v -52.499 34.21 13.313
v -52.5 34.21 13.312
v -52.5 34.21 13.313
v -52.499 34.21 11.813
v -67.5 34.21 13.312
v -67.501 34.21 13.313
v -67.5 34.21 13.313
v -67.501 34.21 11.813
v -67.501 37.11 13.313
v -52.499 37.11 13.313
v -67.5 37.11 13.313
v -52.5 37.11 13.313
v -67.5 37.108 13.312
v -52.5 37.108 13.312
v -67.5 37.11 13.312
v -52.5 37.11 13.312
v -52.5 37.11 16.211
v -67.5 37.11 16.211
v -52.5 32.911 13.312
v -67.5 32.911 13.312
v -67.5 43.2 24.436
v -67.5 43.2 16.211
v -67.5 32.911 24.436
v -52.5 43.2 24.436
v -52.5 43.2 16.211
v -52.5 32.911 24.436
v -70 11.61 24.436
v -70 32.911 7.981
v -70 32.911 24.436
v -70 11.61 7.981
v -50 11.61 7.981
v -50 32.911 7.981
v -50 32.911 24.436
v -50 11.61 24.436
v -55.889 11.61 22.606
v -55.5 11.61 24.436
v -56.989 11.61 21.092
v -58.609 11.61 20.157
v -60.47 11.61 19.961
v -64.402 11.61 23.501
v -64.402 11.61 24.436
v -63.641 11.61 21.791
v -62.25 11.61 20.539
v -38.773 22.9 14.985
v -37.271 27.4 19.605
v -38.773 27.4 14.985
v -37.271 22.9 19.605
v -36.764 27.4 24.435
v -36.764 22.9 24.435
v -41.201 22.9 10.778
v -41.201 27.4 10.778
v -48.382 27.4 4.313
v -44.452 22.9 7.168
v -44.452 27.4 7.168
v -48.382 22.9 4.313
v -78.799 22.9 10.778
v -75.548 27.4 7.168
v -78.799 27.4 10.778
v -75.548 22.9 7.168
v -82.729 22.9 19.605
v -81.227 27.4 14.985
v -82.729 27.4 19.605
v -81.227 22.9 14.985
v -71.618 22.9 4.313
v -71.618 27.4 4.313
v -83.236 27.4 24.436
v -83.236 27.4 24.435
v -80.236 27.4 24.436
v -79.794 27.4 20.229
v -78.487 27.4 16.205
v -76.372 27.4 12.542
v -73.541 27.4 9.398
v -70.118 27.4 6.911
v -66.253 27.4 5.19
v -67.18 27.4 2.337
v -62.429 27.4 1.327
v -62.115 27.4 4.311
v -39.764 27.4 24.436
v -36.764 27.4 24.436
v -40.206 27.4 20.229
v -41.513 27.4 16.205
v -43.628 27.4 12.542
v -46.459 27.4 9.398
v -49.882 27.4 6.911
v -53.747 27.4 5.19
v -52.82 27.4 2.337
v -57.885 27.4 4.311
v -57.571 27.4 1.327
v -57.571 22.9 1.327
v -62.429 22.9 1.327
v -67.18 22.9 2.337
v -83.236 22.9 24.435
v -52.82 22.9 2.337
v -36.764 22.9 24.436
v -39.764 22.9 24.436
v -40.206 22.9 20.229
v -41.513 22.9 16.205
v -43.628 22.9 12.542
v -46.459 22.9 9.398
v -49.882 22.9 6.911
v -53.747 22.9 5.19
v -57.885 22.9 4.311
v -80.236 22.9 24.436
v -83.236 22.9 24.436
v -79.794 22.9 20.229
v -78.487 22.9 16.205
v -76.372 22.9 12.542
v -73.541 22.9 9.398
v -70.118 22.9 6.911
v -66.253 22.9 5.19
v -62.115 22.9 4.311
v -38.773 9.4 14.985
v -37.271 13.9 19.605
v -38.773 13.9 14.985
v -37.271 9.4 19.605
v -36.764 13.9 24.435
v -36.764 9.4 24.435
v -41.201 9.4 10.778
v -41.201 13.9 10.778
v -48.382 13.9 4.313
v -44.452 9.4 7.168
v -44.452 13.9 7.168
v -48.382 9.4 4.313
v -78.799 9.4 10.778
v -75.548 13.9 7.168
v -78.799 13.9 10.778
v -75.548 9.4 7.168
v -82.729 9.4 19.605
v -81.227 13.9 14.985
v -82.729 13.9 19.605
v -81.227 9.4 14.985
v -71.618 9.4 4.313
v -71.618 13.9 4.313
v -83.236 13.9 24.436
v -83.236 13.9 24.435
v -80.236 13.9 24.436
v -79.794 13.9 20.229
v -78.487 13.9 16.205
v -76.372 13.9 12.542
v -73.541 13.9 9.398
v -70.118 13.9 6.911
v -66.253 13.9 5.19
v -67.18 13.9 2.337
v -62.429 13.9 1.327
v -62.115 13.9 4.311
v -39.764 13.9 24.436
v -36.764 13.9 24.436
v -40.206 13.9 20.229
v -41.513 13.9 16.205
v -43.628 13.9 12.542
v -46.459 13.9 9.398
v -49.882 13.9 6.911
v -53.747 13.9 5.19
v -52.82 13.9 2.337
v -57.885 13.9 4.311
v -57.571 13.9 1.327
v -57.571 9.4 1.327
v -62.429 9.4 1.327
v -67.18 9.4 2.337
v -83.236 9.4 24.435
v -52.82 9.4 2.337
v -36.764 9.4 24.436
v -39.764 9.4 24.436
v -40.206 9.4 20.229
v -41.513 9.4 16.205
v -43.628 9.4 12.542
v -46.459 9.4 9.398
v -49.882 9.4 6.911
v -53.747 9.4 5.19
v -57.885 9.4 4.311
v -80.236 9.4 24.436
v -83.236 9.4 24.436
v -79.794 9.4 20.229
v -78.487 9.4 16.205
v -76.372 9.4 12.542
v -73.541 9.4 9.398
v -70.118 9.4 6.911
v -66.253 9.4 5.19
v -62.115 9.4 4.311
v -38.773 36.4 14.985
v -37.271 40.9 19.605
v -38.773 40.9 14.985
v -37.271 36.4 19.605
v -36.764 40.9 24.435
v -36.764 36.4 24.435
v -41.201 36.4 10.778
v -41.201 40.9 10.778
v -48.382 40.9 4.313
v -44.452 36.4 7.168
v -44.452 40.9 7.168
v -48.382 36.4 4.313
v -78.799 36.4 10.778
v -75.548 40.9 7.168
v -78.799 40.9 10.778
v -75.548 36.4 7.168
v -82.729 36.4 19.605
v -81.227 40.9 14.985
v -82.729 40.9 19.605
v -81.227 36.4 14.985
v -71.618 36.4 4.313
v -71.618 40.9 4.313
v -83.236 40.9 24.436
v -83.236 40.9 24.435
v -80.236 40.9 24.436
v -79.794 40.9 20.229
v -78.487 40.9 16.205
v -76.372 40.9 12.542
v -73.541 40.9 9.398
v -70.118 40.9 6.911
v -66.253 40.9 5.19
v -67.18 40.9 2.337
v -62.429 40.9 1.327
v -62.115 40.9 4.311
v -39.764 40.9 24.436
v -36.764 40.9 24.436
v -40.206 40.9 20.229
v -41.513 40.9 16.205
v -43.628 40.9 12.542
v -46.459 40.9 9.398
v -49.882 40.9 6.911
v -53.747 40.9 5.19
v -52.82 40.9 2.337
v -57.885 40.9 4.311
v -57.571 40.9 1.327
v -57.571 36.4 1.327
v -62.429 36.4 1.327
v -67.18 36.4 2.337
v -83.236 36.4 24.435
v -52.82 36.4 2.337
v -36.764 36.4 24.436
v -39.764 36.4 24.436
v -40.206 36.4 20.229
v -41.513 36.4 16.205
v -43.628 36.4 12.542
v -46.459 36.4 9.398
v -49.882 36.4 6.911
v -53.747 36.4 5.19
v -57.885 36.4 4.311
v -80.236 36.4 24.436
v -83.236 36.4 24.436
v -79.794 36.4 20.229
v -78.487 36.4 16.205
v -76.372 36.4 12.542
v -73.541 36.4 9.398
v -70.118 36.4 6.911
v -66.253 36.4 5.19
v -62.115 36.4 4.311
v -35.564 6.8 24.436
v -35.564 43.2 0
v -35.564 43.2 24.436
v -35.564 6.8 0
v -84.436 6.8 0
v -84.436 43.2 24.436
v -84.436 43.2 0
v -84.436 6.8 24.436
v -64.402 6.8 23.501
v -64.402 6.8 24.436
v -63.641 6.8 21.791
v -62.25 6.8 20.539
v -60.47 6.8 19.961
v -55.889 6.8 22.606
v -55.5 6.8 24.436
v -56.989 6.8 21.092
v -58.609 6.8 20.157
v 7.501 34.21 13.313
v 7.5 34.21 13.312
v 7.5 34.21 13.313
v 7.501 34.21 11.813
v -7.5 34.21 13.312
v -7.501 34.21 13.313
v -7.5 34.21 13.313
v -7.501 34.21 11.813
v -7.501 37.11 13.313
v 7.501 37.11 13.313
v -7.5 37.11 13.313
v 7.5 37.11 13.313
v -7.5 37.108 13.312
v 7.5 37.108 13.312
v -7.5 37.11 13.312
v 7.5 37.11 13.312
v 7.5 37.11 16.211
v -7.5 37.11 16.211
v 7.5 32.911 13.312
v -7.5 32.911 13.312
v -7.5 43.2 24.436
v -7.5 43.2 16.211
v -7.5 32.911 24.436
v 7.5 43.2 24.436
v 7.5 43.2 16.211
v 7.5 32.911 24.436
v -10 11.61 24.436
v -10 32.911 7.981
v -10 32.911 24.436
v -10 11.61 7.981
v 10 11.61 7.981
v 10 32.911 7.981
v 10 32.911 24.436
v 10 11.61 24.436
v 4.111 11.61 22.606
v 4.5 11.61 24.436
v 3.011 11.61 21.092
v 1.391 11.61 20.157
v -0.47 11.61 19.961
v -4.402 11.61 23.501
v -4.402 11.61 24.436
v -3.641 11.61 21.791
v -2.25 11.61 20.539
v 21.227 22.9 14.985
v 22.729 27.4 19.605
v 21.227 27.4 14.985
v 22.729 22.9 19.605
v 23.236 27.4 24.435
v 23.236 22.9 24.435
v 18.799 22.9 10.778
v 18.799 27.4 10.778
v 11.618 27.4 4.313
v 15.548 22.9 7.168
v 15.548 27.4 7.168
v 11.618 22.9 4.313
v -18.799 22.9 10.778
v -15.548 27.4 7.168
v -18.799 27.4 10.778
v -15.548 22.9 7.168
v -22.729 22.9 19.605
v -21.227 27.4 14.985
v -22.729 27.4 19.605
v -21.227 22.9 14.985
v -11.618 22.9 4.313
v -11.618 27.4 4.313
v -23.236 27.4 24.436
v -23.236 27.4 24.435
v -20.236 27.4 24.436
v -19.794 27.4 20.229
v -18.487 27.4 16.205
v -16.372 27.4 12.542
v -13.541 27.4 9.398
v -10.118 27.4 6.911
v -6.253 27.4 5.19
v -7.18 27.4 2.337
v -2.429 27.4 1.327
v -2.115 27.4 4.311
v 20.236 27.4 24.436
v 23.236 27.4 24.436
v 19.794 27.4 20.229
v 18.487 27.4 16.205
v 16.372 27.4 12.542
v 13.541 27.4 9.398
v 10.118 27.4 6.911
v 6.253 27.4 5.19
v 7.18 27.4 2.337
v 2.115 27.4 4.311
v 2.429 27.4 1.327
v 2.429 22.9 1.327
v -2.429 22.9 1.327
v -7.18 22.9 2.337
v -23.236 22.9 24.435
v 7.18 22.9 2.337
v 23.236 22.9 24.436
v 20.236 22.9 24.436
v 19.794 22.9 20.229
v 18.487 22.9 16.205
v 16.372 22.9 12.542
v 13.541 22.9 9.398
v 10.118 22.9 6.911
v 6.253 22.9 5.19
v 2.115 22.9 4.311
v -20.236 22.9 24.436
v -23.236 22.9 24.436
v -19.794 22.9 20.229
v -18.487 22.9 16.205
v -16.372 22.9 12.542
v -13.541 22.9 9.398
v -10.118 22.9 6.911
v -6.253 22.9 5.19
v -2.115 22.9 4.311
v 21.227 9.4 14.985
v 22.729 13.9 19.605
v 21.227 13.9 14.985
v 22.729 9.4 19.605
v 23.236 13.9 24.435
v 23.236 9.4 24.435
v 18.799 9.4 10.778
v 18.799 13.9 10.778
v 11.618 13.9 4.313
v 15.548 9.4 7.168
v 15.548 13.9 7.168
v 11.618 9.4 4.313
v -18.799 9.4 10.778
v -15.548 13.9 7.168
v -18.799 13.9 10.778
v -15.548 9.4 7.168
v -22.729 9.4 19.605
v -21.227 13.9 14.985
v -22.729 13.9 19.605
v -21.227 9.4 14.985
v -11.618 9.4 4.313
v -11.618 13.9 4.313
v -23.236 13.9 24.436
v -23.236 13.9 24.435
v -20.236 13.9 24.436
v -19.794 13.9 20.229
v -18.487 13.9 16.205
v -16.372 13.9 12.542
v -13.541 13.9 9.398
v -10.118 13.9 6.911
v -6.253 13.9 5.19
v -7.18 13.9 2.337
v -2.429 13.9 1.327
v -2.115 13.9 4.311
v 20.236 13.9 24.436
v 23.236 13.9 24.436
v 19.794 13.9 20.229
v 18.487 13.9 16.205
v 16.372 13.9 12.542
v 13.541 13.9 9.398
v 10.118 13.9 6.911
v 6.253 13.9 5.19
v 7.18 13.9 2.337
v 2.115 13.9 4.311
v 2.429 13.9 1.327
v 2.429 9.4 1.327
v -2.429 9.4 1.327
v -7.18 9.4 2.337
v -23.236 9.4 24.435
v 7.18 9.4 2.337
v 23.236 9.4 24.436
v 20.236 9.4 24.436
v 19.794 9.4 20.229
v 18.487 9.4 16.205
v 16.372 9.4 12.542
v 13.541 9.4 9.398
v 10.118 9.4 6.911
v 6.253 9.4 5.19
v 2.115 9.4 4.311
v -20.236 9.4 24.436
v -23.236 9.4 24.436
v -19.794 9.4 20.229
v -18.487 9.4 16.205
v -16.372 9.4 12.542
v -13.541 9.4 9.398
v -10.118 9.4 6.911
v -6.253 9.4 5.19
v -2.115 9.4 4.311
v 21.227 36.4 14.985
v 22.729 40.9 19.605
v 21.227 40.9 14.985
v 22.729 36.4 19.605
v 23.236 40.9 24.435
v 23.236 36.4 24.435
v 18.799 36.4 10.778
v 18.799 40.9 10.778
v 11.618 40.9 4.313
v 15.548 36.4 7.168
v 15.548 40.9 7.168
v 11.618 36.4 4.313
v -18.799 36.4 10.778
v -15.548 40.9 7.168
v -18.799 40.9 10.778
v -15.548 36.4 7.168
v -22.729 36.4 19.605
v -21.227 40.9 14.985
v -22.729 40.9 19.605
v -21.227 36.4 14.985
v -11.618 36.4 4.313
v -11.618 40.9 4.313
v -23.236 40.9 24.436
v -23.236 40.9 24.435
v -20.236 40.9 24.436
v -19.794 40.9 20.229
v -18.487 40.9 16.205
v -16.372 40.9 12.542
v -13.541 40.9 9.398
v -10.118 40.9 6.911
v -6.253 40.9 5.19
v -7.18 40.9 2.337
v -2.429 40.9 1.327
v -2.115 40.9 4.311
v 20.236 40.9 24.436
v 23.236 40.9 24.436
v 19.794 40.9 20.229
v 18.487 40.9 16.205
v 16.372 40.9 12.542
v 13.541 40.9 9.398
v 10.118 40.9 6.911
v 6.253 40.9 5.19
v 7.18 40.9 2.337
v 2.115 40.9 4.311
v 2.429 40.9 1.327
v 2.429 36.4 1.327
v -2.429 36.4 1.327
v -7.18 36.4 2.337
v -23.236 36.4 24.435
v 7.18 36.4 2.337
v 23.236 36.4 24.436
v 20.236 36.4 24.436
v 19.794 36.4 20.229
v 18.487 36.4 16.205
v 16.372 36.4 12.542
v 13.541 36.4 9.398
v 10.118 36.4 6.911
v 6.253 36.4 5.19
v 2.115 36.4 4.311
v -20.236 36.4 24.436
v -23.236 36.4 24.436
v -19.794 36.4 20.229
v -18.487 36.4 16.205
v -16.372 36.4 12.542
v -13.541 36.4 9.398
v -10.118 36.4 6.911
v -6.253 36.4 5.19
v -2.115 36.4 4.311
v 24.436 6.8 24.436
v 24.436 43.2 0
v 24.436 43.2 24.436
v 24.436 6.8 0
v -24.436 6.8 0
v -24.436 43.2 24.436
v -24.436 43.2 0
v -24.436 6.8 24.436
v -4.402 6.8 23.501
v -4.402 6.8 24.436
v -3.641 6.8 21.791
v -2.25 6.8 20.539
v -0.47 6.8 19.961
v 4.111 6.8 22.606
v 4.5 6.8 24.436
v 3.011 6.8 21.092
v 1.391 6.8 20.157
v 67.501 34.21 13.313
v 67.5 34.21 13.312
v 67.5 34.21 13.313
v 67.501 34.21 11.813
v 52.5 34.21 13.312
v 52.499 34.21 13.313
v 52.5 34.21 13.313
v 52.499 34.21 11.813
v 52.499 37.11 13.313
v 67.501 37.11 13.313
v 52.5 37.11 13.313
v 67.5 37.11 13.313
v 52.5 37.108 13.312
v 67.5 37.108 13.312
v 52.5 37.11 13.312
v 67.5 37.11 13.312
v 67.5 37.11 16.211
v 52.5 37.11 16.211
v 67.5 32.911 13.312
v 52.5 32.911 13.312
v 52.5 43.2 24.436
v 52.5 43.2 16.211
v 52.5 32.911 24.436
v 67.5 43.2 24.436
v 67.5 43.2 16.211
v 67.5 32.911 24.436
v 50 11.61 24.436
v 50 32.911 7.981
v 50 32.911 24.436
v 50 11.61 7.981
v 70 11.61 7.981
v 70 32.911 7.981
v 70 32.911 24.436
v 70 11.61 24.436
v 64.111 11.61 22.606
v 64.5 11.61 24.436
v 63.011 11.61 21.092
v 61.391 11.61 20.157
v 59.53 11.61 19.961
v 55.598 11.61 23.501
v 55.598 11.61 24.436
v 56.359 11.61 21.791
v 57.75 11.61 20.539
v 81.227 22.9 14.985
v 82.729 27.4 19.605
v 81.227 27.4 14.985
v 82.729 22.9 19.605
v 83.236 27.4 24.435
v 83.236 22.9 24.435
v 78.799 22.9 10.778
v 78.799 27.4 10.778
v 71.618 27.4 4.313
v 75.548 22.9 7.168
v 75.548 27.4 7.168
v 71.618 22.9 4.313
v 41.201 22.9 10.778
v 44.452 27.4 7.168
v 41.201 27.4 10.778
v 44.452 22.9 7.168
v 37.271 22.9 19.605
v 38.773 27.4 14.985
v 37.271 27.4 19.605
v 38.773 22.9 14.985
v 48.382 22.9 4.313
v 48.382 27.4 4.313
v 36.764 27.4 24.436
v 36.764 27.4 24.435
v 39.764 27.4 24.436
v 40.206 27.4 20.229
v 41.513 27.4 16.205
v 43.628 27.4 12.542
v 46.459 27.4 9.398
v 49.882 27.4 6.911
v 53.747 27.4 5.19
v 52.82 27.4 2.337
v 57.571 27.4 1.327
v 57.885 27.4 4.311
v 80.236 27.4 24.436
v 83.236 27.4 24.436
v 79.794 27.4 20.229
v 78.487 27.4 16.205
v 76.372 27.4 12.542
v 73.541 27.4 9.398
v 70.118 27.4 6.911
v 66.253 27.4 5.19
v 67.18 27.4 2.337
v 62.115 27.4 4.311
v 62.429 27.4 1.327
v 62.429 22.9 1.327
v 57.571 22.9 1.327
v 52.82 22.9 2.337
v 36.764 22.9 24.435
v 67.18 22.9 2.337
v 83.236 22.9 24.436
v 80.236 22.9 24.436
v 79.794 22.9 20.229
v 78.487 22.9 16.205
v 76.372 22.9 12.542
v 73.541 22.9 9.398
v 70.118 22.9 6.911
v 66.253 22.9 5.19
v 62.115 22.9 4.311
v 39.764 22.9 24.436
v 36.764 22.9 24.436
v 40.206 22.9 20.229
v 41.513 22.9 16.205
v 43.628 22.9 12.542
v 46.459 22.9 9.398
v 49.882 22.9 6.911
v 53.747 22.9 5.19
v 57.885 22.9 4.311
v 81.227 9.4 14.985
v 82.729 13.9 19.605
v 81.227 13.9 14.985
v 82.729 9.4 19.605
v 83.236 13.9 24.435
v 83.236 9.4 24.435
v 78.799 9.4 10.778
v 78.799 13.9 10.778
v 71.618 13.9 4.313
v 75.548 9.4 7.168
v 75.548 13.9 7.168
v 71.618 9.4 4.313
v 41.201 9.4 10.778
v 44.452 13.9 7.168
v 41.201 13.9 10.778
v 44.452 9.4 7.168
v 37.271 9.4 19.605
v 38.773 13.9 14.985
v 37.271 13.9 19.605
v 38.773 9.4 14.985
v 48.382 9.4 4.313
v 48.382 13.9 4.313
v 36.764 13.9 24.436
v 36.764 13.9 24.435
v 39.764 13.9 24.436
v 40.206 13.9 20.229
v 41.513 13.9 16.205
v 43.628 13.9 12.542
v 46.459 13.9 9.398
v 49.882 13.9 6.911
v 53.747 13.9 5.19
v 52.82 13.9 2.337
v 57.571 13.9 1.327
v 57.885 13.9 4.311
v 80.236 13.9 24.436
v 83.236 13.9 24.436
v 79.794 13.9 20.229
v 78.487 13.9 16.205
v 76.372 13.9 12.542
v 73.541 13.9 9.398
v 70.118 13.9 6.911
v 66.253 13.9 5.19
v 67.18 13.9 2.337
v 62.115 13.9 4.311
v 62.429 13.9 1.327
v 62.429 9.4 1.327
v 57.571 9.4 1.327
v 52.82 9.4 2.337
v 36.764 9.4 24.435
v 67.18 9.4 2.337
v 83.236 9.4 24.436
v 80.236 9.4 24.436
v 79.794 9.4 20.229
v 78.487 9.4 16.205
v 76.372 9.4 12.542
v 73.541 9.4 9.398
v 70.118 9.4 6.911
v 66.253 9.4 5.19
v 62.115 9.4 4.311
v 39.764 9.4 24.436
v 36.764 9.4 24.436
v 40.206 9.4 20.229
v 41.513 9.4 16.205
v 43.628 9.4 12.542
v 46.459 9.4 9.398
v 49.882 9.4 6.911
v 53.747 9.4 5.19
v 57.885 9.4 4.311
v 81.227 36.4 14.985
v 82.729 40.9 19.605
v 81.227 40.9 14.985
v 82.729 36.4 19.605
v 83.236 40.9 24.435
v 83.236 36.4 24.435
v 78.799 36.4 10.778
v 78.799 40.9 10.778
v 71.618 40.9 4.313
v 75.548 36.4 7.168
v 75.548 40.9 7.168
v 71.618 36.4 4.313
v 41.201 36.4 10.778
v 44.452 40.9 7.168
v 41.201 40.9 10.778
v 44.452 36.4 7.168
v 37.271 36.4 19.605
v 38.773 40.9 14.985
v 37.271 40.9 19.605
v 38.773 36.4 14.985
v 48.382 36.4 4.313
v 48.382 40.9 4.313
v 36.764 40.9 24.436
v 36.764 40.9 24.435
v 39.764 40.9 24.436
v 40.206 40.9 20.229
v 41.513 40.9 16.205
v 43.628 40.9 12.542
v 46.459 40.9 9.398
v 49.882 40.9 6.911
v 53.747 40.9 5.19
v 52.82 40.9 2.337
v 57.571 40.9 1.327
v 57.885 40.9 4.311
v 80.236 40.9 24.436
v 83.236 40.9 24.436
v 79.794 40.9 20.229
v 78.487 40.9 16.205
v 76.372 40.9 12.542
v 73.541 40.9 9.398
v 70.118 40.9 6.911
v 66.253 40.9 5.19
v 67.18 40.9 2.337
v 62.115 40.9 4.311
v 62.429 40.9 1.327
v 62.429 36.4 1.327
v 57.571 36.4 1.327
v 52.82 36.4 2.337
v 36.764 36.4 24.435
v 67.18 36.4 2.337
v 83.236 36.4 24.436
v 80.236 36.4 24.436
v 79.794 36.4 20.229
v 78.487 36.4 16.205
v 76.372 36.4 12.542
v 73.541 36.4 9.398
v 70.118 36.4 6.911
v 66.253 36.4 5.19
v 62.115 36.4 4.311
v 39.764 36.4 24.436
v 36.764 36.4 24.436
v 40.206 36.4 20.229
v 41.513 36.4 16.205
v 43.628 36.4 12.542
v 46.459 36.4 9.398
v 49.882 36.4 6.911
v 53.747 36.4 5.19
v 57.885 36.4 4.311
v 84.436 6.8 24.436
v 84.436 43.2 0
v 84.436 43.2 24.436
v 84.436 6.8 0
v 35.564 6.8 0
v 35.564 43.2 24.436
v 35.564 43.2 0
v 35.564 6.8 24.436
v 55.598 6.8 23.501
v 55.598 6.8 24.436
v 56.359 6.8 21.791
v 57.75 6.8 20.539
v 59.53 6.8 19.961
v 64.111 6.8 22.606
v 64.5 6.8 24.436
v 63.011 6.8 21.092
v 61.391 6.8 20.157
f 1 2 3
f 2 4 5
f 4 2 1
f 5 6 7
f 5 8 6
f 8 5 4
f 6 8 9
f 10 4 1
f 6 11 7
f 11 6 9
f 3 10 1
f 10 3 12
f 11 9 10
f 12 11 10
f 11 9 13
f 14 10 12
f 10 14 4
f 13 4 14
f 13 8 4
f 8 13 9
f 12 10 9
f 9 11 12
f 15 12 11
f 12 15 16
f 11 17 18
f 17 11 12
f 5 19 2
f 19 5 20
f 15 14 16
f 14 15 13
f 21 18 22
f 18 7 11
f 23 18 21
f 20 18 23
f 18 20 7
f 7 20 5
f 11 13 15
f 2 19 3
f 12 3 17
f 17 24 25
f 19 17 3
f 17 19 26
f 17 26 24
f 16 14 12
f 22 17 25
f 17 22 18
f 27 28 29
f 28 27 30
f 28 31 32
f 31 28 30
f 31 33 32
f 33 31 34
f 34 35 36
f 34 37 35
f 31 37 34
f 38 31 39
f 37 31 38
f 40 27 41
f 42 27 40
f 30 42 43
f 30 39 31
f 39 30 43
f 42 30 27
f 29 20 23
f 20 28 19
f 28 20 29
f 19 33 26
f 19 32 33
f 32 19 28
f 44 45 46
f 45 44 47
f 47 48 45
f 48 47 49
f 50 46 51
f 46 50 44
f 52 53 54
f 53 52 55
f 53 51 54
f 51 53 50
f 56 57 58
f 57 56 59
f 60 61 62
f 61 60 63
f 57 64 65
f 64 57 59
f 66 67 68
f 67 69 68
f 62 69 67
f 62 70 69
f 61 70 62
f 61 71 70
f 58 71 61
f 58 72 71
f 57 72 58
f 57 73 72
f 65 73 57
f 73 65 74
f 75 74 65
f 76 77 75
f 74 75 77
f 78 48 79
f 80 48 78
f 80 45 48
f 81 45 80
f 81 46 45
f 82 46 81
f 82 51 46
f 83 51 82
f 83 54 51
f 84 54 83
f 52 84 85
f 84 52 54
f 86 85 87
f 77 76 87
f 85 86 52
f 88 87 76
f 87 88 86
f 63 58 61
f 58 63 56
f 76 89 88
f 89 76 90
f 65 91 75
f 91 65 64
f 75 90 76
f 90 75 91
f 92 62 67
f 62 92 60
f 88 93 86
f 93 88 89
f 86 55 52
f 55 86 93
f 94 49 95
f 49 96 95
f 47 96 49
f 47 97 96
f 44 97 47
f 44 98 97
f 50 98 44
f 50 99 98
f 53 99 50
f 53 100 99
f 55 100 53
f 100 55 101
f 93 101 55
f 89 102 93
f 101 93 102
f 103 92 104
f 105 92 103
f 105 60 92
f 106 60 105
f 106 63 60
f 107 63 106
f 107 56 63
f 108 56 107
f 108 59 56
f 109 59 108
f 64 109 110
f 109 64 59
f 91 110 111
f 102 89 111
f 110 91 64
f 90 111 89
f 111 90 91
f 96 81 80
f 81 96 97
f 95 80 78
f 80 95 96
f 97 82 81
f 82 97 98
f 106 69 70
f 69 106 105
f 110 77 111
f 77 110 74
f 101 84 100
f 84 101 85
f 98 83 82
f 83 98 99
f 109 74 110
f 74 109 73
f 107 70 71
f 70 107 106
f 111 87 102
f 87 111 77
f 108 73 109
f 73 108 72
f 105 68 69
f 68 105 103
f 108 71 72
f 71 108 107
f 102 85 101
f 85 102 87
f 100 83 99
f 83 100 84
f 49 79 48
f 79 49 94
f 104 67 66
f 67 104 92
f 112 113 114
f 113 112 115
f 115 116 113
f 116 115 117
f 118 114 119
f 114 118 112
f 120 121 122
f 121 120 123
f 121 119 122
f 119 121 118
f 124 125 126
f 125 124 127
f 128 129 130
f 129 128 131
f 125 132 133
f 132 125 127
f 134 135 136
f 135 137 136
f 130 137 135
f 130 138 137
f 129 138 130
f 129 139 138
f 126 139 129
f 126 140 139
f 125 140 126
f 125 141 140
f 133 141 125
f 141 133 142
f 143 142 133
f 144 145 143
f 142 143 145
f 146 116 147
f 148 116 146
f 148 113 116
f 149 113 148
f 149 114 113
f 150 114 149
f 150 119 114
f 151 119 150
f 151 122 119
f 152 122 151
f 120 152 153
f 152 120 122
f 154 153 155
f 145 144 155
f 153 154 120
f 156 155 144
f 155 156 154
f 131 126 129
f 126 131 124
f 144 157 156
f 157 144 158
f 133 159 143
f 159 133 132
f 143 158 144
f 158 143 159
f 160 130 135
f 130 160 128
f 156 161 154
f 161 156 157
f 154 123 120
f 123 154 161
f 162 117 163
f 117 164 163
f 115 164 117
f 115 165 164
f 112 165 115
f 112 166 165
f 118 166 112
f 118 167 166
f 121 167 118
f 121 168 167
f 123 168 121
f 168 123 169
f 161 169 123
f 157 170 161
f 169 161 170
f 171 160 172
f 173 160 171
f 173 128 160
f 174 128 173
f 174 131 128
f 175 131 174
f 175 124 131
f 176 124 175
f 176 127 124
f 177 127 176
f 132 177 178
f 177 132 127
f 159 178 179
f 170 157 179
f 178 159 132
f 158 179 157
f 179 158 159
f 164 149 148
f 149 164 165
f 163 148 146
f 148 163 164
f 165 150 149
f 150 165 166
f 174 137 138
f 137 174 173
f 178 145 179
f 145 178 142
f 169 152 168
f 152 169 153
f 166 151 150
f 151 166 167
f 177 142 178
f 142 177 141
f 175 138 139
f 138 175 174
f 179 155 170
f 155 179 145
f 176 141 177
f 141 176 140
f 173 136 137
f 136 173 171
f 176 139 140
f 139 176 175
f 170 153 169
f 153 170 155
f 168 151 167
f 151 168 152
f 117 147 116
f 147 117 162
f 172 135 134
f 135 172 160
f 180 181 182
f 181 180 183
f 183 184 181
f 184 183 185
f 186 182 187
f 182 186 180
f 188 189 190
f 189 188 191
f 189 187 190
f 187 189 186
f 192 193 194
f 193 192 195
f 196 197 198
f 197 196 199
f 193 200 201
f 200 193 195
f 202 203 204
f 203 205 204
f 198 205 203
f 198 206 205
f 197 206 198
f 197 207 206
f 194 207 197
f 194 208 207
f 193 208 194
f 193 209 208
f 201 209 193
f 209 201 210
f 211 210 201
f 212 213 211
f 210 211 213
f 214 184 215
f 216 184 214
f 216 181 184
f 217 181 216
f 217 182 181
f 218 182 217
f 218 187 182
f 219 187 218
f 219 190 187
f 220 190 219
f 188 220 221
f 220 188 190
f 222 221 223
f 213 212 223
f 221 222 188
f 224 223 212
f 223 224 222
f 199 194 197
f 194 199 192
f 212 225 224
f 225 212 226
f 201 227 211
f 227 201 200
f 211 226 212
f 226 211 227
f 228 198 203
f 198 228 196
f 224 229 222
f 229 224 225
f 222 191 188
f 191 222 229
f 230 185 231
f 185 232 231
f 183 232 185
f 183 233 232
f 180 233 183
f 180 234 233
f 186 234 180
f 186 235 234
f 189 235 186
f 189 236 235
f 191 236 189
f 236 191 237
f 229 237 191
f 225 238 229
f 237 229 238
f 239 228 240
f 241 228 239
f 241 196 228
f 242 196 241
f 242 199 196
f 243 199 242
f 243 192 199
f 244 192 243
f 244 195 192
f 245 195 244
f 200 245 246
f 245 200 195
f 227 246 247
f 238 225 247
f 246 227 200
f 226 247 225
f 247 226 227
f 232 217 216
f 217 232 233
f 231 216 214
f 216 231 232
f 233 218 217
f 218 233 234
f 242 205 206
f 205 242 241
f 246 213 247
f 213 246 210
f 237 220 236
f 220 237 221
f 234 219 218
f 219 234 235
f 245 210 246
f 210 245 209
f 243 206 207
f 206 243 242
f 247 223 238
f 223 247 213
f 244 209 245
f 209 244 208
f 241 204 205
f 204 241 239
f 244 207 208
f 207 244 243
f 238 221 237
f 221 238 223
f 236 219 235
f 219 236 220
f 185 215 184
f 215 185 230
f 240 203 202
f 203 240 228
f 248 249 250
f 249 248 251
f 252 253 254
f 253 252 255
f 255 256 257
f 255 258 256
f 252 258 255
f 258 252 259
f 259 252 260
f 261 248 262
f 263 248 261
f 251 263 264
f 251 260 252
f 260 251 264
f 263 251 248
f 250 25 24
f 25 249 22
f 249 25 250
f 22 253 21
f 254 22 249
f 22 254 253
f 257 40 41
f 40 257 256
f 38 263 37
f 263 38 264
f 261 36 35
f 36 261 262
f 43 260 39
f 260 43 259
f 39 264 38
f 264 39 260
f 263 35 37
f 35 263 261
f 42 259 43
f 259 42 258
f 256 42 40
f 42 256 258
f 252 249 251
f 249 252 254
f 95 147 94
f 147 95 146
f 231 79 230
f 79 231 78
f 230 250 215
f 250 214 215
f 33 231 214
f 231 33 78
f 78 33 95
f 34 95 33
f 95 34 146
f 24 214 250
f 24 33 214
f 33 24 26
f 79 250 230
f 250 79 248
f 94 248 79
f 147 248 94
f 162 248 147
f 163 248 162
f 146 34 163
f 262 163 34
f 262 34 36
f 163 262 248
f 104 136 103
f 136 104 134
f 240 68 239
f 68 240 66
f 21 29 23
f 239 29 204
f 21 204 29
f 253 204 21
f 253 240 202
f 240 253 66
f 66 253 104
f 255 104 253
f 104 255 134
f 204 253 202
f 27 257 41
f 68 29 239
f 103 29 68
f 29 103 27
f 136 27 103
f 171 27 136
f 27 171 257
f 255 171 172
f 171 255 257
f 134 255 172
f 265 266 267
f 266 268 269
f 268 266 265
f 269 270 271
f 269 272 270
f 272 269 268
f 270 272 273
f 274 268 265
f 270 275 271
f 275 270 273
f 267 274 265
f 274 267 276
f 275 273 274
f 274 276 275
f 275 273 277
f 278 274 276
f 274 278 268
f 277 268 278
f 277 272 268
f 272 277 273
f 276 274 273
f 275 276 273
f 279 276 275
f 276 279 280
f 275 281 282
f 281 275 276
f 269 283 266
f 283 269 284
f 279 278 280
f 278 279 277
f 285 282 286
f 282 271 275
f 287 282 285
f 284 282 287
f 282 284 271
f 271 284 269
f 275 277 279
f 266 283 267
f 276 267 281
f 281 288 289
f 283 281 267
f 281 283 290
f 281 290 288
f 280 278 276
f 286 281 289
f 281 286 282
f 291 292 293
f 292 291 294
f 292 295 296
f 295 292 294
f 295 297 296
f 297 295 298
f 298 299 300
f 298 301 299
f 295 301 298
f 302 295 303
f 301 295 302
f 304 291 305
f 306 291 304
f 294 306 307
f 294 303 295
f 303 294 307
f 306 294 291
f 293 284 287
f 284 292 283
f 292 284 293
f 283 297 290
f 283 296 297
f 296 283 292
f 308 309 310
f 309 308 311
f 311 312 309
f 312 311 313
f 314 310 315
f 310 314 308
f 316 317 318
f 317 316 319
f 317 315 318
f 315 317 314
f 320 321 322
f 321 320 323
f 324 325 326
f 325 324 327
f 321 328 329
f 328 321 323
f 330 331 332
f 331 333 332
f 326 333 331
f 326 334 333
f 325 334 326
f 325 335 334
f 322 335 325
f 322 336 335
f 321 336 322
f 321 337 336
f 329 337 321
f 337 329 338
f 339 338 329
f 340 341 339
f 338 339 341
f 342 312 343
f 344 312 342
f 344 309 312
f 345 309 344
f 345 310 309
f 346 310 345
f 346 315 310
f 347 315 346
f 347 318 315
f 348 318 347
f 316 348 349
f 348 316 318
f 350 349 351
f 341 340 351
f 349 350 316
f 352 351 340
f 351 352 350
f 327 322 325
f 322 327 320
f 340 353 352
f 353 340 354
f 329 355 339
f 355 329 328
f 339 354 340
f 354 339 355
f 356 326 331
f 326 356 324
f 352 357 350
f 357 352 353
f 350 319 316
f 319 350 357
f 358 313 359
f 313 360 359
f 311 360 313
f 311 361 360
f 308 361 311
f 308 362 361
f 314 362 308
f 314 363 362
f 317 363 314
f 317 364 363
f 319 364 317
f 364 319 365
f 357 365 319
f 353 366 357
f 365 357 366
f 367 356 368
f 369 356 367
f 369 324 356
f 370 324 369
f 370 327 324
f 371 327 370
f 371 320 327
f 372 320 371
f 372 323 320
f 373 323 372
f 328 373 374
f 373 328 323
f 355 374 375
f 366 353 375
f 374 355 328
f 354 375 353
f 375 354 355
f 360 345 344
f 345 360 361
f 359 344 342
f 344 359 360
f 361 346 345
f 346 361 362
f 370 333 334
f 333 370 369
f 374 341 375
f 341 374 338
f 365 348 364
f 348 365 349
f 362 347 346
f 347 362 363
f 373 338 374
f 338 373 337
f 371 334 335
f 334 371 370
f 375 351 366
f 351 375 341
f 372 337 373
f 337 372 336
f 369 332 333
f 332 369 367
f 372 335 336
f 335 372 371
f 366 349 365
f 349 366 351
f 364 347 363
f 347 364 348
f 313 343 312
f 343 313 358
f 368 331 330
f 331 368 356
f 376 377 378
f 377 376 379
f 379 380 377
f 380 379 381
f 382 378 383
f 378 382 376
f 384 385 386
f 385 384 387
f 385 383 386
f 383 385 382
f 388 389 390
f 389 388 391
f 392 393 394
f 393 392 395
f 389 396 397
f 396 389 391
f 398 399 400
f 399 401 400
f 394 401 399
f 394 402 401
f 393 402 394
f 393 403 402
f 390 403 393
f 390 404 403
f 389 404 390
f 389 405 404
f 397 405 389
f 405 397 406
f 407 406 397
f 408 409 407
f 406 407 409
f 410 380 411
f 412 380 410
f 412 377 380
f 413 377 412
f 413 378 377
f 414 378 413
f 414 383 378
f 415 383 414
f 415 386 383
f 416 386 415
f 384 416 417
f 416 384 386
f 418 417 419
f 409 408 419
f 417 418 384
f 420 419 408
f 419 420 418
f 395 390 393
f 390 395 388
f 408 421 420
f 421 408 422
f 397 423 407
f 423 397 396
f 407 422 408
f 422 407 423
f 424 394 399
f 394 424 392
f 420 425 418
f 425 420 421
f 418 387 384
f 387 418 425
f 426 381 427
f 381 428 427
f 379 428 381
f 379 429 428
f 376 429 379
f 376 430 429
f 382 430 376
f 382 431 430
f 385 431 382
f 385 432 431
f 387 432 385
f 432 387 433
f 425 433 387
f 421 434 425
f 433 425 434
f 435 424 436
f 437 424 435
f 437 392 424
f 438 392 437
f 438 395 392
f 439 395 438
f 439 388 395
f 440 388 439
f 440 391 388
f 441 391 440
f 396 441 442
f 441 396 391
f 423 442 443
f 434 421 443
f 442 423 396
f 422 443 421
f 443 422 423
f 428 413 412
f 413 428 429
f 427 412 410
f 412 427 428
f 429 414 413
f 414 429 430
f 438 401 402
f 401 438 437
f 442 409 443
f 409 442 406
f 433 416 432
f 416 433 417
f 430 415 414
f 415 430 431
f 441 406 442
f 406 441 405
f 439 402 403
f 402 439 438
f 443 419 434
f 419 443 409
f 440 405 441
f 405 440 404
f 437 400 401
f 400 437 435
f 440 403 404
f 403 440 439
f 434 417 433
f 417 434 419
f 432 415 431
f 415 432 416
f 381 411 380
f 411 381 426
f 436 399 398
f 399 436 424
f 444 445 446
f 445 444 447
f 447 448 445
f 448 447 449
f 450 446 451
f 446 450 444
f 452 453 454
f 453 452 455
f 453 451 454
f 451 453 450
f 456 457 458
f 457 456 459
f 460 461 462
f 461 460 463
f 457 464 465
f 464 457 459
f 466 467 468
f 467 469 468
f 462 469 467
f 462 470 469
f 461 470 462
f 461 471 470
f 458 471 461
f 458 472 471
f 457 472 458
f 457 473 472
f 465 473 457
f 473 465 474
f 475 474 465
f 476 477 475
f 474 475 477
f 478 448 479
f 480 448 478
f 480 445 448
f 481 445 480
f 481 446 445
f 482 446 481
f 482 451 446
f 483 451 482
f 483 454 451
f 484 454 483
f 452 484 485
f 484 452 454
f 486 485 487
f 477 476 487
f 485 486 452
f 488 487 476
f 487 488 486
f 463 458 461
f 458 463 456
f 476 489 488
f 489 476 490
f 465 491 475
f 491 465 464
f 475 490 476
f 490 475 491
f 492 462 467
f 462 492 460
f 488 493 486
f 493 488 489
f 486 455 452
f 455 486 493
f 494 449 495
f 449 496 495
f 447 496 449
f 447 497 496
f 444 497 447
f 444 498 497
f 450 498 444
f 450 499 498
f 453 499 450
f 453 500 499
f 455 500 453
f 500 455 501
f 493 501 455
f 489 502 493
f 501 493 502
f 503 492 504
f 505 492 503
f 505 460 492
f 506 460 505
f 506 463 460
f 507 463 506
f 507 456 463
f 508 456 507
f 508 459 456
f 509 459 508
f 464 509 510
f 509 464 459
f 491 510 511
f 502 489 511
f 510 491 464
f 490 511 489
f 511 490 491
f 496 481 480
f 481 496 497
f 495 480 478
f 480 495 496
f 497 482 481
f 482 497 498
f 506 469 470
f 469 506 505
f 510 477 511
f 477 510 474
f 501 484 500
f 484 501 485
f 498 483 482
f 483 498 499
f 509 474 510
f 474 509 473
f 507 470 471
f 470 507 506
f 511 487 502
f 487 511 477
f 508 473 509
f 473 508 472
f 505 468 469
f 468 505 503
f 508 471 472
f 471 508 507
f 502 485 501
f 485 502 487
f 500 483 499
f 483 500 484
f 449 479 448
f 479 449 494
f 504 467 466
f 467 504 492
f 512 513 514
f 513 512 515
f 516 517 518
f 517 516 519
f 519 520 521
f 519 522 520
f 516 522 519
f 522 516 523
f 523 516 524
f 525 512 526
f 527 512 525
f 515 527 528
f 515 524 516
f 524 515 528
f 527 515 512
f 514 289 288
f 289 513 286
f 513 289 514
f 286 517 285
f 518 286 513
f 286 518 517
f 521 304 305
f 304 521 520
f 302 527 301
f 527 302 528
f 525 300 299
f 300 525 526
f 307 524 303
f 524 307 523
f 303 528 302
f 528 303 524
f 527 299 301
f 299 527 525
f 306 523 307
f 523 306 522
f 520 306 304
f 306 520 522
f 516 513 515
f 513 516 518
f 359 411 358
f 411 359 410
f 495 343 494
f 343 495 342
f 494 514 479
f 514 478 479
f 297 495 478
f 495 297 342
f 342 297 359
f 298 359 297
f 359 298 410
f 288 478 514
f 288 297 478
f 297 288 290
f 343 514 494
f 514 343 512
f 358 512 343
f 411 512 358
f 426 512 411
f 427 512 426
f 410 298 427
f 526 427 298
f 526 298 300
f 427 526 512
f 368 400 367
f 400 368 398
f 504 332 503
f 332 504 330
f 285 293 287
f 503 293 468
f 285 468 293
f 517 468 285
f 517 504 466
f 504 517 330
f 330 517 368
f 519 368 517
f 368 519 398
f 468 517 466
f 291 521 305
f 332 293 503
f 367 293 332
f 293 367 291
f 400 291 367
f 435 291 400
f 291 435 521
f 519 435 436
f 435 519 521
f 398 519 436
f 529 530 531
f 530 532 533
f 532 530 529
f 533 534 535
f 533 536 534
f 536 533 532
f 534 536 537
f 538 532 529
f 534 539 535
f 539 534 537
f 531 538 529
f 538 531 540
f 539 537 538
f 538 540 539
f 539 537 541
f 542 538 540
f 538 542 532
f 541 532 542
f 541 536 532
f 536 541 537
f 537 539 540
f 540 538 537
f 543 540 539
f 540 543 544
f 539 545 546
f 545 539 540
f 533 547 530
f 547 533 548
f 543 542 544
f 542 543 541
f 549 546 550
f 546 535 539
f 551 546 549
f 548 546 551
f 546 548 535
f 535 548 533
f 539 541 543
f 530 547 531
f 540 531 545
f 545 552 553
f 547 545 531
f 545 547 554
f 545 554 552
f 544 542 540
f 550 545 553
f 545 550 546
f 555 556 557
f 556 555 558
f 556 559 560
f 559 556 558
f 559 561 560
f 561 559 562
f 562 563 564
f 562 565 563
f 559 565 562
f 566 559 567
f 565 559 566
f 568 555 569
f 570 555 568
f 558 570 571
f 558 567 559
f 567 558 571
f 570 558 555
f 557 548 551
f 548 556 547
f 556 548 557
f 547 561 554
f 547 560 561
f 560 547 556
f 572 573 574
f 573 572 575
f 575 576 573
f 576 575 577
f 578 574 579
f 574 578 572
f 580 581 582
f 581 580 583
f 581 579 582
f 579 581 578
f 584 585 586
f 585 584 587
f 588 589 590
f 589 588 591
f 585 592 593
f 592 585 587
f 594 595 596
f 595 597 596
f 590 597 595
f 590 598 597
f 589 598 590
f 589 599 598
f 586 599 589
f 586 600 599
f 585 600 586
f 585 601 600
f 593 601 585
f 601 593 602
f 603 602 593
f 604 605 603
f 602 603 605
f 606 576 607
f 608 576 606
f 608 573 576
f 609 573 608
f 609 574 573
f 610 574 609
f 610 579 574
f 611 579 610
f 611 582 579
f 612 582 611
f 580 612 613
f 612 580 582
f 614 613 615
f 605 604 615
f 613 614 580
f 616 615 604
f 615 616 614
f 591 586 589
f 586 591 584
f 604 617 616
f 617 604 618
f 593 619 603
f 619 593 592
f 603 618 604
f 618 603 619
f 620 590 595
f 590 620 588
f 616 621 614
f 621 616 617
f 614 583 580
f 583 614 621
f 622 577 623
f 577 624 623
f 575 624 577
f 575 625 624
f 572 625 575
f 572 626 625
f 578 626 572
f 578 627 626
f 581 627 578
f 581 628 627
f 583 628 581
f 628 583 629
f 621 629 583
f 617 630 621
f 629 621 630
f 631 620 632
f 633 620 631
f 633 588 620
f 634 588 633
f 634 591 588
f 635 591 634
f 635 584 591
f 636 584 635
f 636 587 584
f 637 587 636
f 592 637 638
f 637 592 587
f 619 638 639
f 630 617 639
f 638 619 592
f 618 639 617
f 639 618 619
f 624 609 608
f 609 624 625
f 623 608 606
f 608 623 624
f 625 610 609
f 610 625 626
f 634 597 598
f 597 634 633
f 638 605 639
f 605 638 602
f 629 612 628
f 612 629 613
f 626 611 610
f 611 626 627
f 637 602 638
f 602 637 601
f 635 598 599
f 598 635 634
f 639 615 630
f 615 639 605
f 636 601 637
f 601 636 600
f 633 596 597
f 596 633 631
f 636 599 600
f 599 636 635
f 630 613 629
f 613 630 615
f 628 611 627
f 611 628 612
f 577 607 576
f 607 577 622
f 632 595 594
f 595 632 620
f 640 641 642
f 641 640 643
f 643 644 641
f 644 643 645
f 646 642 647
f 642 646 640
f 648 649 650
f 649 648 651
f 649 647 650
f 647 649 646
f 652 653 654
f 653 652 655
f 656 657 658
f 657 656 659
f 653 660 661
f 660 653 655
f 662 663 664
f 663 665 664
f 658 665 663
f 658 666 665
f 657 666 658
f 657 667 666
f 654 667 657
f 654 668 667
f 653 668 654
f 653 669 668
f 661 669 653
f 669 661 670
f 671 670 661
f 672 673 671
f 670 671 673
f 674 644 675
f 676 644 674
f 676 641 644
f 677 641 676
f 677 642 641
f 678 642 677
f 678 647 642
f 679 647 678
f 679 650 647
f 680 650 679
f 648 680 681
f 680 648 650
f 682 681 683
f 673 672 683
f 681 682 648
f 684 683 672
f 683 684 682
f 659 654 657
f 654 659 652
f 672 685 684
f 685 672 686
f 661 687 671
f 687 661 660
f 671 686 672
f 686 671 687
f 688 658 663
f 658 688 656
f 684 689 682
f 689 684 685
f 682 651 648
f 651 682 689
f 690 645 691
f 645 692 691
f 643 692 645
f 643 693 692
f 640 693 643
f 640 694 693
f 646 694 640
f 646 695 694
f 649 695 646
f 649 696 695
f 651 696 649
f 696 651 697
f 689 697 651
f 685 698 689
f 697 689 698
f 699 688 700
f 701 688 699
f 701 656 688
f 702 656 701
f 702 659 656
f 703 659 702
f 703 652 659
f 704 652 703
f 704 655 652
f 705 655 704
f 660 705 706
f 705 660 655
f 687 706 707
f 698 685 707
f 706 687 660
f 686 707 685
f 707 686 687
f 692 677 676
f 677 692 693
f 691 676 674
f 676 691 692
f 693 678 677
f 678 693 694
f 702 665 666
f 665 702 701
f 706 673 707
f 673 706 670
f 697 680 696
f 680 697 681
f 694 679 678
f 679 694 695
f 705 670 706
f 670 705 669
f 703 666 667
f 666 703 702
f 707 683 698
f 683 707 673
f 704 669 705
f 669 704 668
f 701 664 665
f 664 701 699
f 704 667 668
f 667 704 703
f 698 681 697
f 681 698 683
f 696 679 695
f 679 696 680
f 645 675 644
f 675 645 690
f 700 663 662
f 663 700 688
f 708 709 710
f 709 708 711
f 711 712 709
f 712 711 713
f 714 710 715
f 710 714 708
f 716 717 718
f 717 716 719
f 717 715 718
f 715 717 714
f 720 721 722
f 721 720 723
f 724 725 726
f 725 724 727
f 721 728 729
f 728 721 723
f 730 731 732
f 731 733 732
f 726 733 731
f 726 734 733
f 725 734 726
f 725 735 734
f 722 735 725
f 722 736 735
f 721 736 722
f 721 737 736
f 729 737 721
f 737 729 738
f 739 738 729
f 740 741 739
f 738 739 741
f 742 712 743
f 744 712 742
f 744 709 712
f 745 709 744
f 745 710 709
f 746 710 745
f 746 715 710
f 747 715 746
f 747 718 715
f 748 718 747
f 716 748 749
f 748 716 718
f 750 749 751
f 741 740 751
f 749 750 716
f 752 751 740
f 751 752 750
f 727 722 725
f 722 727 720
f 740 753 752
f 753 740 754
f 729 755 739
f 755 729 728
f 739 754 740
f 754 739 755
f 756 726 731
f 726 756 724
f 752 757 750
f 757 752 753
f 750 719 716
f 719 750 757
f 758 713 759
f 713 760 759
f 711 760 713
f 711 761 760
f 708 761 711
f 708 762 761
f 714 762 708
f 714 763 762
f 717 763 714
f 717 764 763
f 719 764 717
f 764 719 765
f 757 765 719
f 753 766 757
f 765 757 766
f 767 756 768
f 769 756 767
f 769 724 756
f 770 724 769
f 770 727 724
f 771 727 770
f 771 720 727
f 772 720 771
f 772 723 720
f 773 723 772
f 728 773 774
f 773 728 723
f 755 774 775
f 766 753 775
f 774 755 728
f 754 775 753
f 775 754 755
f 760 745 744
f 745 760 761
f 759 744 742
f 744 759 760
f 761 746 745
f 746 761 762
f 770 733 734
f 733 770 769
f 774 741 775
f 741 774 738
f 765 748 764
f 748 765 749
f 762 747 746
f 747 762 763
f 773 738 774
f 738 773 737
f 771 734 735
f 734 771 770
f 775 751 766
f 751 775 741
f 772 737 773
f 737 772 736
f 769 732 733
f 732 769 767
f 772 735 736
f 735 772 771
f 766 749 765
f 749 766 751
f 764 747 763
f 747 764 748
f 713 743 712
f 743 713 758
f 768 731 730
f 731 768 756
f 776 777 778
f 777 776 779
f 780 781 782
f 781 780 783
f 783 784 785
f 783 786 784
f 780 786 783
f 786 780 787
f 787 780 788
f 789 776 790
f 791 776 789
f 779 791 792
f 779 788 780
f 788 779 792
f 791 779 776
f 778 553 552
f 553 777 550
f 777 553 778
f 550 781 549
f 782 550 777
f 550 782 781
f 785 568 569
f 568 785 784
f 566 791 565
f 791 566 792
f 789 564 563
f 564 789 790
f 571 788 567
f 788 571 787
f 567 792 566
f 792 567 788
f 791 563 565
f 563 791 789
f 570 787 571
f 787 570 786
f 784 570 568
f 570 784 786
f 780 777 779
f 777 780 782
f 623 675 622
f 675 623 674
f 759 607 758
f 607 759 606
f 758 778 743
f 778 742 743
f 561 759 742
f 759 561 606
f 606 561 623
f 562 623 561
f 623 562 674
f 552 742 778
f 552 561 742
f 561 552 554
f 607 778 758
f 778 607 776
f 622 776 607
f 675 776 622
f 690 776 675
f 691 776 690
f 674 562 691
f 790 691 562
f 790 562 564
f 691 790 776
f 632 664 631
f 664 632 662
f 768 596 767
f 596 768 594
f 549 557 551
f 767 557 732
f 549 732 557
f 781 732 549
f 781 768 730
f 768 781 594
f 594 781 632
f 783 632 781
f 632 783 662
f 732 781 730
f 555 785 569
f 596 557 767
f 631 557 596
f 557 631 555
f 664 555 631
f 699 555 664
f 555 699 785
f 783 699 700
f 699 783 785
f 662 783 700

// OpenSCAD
// file: helpers.scad
module sliceat(total,slice,top=true,x=205,y=205) {
    remain=total-slice;
    translate([0,0,top?remain:slice]) 
    rotate([180,0,0]) 
    render() intersection() { 
        translate([-x/2,-y/2,0]) 
        cube([x,y,top?remain:slice]);
        
        rotate([(top?0:180),0,0]) 
        translate([0,0,-slice]) 
        children();
    }
}

module partarc(r,w,h) {
    
    D=(pow(r,2)+pow(w/2,2))/r;
    translate([0,-D/2+r,h/2])
    difference() {
        cylinder(d=D,h=h,center=true);
        translate([0,-r,0]) cube([D+1,D,h+7],true);
    }
}

module midslice(bottom,h,x=5000,y=5000,center=true) {
    intersection() {
        translate([-2500,-2500,0]) cube([5000,5000,h]);
        translate([0,0,-bottom]) children();
    }
}
// main file
use<./helpers.scad>;

zipwidth=4.5;
zipthickness=3;
    
    
clipx=4.43;
cliptrianglex=1.36;
cliptriangley=1.5;
cliplength=1.58;  
clipheight=1.4;

tabtrianglex=2.9;
tabtriangley=1.5;
tablength=4.02;  
tabheight=2.9+tabtriangley;

slop=0.2;
wall=1.2;

frontwidth=15;
frontheight=16.45;
frontlength=9;

backwidth=15.0;
backlength=1.3;
backheight=18.78;

cavitywidth=20.0;
cavitylength=31.6-frontlength-backlength;
cavityheight=30.5;
cavityoffset=-5.82;

jackbackpad=5;

reartabheight=3.3;
reartabwidth=5;
reartablength=10;

wall_height = 10;
wall_thickness = 4;
cliptriangletop=22;


module right_triangle_extrude(x,y,h) {
    translate([-x,0,-h/2])
    difference() {
        cube([x,y,h]);
        translate([0,0,-.5]) rotate(atan(y/x)) cube([x+y,x+y,h+1]);
    }
}
module clip2(trix,triy,length,height,width) {
    difference() {
        translate([0,-width/2,0]) cube([length+trix,width,height]);
        translate([-.001,0,-.001]) rotate([90,0,180]) right_triangle_extrude(trix,triy,width+.002);
    }
}
module clip(trix,triy,length,height,width) {
    union() {
        translate([0,-width/2,0]) cube([length+trix,width,height-triy]);
        translate([length,0,height-.001-triy]) rotate([90,0,180]) right_triangle_extrude(trix,triy,width+.002);
    }
}
module keystone(solid = false) {
    mirror([0,0,1]) rotate([0,180,0]) translate([0,-0.01,-frontheight/2]) 
    union() {
        translate([-frontwidth/2,0,0]) cube([frontwidth,frontlength+.001,frontheight]);
        translate([-backwidth/2,frontlength-0.001,0]) cube([backwidth,backlength+.001,frontheight]);
        translate([-cavitywidth/2,frontlength+backlength-0.001,cavityoffset]) cube([cavitywidth,cavitylength+.001,cavityheight]);
        translate([0,frontlength+backlength,frontheight-.001]) rotate([0,0,-90]) clip(tabtrianglex,tabtriangley,backlength,tabheight,frontwidth);
        #translate([0,frontlength+backlength,.001])rotate([0,0,-90]) mirror([0,0,1]) clip(cliptrianglex,cliptriangley,backlength,clipheight,frontwidth);
    }
}
module keystone2(solid = false) {
    rotate([0,180,0]) translate([0,-0.01,-frontheight/2]) 
    union() {
        translate([-frontwidth/2,0,0]) cube([frontwidth,frontlength+.001,frontheight]);
        translate([-backwidth/2,frontlength-0.001,0]) cube([backwidth,backlength+.001,backheight]);
        translate([-cavitywidth/2,frontlength+backlength-0.001,cavityoffset]) cube([cavitywidth,cavitylength+.001,cavityheight]);
        translate([0,frontlength+backlength,frontheight+tabheight-.001]) rotate([0,0,-90]) mirror([0,0,1]) clip2(tabtrianglex,tabtriangley,tablength,tabheight,frontwidth);
        translate([0,frontlength+backlength,-clipheight+.001])rotate([0,0,-90]) clip2(cliptrianglex,cliptriangley,cliplength,clipheight,frontwidth);
    }
}
module cavityarch(ir,or,w,t,a) {
    id=ir*2;
    od=or*2;
    rotate([90,0,0]) {
        intersection() {
            difference() {
                cylinder(r=or,h=w);
                translate([0,0,-0.001]) cylinder(r=ir,h=w+0.002);
            }
            translate([-or-0.001,0,-0.001]) cube([od+0.002,or+0.001,w+0.002]);
        }
        difference() {
            translate([-or,-a-0.001,0]) cube([od,a+0.002,w]);
            translate([-ir,-a-0.002,-0.001]) cube([id,a+0.004,w+0.002]);
        }
    }
}

keystonezipmountsliceat=cavityheight/2+wall;
ir=2+sqrt(pow(cavityheight/2,2)+pow(cavitywidth/2,2));
    or=(ir+zipthickness);
keystonezipmountheight=or+keystonezipmountsliceat+wall;

module keystonezipmount(r=0) {
    arch=keystonezipmountsliceat;
    w=or*2+2*wall;
    h=keystonezipmountheight;
    l=frontlength+backlength+cavitylength+wall*4;
    translate([0,-l/2,arch])
    difference() 
    { 
            translate([-w/2,0,-arch+.001]) cube([w,l,h]);
            keystone();
            translate([0,(cavitylength+2*zipwidth+frontlength+backlength)/2,0]) {
                translate([0,zipwidth*3,0]) cavityarch(ir,or,zipwidth,zipthickness,arch);
                cavityarch(ir,or,zipwidth,zipthickness,arch);
                translate([0,-zipwidth*3,0]) cavityarch(ir,or,zipwidth,zipthickness,arch);
            }
            rotate([-90,0,0]) cylinder(d=9,h=l+0.002);
        }
}

module keystonezipmounts() {
    o=8;
    s=48;
    b=0;
    y=1;
    s=1;
    for (x=[-2,0,2]) 
        //for(y=[-1,1]) 
            //for(s=[-1,1])
                translate([x*30,y*50+y*s*-25]) sliceat(keystonezipmountheight(),keystonezipmountsliceat(),s==1) keystonezipmount();
}
module keystonezipmountpair() {
    o=8;
    s=48;
    b=0;
    for (x=[1]) for(y=[1]) for(s=[-1,1])  translate([x*30,y*50+y*s*-25]) sliceat(keystonezipmountheight(),keystonezipmountsliceat(),s==1) keystonezipmount();
}

function keystonezipmountsliceat() = keystonezipmountsliceat;
function keystonezipmountheight() = keystonezipmountheight;
keystone(true);
!keystonezipmounts();
